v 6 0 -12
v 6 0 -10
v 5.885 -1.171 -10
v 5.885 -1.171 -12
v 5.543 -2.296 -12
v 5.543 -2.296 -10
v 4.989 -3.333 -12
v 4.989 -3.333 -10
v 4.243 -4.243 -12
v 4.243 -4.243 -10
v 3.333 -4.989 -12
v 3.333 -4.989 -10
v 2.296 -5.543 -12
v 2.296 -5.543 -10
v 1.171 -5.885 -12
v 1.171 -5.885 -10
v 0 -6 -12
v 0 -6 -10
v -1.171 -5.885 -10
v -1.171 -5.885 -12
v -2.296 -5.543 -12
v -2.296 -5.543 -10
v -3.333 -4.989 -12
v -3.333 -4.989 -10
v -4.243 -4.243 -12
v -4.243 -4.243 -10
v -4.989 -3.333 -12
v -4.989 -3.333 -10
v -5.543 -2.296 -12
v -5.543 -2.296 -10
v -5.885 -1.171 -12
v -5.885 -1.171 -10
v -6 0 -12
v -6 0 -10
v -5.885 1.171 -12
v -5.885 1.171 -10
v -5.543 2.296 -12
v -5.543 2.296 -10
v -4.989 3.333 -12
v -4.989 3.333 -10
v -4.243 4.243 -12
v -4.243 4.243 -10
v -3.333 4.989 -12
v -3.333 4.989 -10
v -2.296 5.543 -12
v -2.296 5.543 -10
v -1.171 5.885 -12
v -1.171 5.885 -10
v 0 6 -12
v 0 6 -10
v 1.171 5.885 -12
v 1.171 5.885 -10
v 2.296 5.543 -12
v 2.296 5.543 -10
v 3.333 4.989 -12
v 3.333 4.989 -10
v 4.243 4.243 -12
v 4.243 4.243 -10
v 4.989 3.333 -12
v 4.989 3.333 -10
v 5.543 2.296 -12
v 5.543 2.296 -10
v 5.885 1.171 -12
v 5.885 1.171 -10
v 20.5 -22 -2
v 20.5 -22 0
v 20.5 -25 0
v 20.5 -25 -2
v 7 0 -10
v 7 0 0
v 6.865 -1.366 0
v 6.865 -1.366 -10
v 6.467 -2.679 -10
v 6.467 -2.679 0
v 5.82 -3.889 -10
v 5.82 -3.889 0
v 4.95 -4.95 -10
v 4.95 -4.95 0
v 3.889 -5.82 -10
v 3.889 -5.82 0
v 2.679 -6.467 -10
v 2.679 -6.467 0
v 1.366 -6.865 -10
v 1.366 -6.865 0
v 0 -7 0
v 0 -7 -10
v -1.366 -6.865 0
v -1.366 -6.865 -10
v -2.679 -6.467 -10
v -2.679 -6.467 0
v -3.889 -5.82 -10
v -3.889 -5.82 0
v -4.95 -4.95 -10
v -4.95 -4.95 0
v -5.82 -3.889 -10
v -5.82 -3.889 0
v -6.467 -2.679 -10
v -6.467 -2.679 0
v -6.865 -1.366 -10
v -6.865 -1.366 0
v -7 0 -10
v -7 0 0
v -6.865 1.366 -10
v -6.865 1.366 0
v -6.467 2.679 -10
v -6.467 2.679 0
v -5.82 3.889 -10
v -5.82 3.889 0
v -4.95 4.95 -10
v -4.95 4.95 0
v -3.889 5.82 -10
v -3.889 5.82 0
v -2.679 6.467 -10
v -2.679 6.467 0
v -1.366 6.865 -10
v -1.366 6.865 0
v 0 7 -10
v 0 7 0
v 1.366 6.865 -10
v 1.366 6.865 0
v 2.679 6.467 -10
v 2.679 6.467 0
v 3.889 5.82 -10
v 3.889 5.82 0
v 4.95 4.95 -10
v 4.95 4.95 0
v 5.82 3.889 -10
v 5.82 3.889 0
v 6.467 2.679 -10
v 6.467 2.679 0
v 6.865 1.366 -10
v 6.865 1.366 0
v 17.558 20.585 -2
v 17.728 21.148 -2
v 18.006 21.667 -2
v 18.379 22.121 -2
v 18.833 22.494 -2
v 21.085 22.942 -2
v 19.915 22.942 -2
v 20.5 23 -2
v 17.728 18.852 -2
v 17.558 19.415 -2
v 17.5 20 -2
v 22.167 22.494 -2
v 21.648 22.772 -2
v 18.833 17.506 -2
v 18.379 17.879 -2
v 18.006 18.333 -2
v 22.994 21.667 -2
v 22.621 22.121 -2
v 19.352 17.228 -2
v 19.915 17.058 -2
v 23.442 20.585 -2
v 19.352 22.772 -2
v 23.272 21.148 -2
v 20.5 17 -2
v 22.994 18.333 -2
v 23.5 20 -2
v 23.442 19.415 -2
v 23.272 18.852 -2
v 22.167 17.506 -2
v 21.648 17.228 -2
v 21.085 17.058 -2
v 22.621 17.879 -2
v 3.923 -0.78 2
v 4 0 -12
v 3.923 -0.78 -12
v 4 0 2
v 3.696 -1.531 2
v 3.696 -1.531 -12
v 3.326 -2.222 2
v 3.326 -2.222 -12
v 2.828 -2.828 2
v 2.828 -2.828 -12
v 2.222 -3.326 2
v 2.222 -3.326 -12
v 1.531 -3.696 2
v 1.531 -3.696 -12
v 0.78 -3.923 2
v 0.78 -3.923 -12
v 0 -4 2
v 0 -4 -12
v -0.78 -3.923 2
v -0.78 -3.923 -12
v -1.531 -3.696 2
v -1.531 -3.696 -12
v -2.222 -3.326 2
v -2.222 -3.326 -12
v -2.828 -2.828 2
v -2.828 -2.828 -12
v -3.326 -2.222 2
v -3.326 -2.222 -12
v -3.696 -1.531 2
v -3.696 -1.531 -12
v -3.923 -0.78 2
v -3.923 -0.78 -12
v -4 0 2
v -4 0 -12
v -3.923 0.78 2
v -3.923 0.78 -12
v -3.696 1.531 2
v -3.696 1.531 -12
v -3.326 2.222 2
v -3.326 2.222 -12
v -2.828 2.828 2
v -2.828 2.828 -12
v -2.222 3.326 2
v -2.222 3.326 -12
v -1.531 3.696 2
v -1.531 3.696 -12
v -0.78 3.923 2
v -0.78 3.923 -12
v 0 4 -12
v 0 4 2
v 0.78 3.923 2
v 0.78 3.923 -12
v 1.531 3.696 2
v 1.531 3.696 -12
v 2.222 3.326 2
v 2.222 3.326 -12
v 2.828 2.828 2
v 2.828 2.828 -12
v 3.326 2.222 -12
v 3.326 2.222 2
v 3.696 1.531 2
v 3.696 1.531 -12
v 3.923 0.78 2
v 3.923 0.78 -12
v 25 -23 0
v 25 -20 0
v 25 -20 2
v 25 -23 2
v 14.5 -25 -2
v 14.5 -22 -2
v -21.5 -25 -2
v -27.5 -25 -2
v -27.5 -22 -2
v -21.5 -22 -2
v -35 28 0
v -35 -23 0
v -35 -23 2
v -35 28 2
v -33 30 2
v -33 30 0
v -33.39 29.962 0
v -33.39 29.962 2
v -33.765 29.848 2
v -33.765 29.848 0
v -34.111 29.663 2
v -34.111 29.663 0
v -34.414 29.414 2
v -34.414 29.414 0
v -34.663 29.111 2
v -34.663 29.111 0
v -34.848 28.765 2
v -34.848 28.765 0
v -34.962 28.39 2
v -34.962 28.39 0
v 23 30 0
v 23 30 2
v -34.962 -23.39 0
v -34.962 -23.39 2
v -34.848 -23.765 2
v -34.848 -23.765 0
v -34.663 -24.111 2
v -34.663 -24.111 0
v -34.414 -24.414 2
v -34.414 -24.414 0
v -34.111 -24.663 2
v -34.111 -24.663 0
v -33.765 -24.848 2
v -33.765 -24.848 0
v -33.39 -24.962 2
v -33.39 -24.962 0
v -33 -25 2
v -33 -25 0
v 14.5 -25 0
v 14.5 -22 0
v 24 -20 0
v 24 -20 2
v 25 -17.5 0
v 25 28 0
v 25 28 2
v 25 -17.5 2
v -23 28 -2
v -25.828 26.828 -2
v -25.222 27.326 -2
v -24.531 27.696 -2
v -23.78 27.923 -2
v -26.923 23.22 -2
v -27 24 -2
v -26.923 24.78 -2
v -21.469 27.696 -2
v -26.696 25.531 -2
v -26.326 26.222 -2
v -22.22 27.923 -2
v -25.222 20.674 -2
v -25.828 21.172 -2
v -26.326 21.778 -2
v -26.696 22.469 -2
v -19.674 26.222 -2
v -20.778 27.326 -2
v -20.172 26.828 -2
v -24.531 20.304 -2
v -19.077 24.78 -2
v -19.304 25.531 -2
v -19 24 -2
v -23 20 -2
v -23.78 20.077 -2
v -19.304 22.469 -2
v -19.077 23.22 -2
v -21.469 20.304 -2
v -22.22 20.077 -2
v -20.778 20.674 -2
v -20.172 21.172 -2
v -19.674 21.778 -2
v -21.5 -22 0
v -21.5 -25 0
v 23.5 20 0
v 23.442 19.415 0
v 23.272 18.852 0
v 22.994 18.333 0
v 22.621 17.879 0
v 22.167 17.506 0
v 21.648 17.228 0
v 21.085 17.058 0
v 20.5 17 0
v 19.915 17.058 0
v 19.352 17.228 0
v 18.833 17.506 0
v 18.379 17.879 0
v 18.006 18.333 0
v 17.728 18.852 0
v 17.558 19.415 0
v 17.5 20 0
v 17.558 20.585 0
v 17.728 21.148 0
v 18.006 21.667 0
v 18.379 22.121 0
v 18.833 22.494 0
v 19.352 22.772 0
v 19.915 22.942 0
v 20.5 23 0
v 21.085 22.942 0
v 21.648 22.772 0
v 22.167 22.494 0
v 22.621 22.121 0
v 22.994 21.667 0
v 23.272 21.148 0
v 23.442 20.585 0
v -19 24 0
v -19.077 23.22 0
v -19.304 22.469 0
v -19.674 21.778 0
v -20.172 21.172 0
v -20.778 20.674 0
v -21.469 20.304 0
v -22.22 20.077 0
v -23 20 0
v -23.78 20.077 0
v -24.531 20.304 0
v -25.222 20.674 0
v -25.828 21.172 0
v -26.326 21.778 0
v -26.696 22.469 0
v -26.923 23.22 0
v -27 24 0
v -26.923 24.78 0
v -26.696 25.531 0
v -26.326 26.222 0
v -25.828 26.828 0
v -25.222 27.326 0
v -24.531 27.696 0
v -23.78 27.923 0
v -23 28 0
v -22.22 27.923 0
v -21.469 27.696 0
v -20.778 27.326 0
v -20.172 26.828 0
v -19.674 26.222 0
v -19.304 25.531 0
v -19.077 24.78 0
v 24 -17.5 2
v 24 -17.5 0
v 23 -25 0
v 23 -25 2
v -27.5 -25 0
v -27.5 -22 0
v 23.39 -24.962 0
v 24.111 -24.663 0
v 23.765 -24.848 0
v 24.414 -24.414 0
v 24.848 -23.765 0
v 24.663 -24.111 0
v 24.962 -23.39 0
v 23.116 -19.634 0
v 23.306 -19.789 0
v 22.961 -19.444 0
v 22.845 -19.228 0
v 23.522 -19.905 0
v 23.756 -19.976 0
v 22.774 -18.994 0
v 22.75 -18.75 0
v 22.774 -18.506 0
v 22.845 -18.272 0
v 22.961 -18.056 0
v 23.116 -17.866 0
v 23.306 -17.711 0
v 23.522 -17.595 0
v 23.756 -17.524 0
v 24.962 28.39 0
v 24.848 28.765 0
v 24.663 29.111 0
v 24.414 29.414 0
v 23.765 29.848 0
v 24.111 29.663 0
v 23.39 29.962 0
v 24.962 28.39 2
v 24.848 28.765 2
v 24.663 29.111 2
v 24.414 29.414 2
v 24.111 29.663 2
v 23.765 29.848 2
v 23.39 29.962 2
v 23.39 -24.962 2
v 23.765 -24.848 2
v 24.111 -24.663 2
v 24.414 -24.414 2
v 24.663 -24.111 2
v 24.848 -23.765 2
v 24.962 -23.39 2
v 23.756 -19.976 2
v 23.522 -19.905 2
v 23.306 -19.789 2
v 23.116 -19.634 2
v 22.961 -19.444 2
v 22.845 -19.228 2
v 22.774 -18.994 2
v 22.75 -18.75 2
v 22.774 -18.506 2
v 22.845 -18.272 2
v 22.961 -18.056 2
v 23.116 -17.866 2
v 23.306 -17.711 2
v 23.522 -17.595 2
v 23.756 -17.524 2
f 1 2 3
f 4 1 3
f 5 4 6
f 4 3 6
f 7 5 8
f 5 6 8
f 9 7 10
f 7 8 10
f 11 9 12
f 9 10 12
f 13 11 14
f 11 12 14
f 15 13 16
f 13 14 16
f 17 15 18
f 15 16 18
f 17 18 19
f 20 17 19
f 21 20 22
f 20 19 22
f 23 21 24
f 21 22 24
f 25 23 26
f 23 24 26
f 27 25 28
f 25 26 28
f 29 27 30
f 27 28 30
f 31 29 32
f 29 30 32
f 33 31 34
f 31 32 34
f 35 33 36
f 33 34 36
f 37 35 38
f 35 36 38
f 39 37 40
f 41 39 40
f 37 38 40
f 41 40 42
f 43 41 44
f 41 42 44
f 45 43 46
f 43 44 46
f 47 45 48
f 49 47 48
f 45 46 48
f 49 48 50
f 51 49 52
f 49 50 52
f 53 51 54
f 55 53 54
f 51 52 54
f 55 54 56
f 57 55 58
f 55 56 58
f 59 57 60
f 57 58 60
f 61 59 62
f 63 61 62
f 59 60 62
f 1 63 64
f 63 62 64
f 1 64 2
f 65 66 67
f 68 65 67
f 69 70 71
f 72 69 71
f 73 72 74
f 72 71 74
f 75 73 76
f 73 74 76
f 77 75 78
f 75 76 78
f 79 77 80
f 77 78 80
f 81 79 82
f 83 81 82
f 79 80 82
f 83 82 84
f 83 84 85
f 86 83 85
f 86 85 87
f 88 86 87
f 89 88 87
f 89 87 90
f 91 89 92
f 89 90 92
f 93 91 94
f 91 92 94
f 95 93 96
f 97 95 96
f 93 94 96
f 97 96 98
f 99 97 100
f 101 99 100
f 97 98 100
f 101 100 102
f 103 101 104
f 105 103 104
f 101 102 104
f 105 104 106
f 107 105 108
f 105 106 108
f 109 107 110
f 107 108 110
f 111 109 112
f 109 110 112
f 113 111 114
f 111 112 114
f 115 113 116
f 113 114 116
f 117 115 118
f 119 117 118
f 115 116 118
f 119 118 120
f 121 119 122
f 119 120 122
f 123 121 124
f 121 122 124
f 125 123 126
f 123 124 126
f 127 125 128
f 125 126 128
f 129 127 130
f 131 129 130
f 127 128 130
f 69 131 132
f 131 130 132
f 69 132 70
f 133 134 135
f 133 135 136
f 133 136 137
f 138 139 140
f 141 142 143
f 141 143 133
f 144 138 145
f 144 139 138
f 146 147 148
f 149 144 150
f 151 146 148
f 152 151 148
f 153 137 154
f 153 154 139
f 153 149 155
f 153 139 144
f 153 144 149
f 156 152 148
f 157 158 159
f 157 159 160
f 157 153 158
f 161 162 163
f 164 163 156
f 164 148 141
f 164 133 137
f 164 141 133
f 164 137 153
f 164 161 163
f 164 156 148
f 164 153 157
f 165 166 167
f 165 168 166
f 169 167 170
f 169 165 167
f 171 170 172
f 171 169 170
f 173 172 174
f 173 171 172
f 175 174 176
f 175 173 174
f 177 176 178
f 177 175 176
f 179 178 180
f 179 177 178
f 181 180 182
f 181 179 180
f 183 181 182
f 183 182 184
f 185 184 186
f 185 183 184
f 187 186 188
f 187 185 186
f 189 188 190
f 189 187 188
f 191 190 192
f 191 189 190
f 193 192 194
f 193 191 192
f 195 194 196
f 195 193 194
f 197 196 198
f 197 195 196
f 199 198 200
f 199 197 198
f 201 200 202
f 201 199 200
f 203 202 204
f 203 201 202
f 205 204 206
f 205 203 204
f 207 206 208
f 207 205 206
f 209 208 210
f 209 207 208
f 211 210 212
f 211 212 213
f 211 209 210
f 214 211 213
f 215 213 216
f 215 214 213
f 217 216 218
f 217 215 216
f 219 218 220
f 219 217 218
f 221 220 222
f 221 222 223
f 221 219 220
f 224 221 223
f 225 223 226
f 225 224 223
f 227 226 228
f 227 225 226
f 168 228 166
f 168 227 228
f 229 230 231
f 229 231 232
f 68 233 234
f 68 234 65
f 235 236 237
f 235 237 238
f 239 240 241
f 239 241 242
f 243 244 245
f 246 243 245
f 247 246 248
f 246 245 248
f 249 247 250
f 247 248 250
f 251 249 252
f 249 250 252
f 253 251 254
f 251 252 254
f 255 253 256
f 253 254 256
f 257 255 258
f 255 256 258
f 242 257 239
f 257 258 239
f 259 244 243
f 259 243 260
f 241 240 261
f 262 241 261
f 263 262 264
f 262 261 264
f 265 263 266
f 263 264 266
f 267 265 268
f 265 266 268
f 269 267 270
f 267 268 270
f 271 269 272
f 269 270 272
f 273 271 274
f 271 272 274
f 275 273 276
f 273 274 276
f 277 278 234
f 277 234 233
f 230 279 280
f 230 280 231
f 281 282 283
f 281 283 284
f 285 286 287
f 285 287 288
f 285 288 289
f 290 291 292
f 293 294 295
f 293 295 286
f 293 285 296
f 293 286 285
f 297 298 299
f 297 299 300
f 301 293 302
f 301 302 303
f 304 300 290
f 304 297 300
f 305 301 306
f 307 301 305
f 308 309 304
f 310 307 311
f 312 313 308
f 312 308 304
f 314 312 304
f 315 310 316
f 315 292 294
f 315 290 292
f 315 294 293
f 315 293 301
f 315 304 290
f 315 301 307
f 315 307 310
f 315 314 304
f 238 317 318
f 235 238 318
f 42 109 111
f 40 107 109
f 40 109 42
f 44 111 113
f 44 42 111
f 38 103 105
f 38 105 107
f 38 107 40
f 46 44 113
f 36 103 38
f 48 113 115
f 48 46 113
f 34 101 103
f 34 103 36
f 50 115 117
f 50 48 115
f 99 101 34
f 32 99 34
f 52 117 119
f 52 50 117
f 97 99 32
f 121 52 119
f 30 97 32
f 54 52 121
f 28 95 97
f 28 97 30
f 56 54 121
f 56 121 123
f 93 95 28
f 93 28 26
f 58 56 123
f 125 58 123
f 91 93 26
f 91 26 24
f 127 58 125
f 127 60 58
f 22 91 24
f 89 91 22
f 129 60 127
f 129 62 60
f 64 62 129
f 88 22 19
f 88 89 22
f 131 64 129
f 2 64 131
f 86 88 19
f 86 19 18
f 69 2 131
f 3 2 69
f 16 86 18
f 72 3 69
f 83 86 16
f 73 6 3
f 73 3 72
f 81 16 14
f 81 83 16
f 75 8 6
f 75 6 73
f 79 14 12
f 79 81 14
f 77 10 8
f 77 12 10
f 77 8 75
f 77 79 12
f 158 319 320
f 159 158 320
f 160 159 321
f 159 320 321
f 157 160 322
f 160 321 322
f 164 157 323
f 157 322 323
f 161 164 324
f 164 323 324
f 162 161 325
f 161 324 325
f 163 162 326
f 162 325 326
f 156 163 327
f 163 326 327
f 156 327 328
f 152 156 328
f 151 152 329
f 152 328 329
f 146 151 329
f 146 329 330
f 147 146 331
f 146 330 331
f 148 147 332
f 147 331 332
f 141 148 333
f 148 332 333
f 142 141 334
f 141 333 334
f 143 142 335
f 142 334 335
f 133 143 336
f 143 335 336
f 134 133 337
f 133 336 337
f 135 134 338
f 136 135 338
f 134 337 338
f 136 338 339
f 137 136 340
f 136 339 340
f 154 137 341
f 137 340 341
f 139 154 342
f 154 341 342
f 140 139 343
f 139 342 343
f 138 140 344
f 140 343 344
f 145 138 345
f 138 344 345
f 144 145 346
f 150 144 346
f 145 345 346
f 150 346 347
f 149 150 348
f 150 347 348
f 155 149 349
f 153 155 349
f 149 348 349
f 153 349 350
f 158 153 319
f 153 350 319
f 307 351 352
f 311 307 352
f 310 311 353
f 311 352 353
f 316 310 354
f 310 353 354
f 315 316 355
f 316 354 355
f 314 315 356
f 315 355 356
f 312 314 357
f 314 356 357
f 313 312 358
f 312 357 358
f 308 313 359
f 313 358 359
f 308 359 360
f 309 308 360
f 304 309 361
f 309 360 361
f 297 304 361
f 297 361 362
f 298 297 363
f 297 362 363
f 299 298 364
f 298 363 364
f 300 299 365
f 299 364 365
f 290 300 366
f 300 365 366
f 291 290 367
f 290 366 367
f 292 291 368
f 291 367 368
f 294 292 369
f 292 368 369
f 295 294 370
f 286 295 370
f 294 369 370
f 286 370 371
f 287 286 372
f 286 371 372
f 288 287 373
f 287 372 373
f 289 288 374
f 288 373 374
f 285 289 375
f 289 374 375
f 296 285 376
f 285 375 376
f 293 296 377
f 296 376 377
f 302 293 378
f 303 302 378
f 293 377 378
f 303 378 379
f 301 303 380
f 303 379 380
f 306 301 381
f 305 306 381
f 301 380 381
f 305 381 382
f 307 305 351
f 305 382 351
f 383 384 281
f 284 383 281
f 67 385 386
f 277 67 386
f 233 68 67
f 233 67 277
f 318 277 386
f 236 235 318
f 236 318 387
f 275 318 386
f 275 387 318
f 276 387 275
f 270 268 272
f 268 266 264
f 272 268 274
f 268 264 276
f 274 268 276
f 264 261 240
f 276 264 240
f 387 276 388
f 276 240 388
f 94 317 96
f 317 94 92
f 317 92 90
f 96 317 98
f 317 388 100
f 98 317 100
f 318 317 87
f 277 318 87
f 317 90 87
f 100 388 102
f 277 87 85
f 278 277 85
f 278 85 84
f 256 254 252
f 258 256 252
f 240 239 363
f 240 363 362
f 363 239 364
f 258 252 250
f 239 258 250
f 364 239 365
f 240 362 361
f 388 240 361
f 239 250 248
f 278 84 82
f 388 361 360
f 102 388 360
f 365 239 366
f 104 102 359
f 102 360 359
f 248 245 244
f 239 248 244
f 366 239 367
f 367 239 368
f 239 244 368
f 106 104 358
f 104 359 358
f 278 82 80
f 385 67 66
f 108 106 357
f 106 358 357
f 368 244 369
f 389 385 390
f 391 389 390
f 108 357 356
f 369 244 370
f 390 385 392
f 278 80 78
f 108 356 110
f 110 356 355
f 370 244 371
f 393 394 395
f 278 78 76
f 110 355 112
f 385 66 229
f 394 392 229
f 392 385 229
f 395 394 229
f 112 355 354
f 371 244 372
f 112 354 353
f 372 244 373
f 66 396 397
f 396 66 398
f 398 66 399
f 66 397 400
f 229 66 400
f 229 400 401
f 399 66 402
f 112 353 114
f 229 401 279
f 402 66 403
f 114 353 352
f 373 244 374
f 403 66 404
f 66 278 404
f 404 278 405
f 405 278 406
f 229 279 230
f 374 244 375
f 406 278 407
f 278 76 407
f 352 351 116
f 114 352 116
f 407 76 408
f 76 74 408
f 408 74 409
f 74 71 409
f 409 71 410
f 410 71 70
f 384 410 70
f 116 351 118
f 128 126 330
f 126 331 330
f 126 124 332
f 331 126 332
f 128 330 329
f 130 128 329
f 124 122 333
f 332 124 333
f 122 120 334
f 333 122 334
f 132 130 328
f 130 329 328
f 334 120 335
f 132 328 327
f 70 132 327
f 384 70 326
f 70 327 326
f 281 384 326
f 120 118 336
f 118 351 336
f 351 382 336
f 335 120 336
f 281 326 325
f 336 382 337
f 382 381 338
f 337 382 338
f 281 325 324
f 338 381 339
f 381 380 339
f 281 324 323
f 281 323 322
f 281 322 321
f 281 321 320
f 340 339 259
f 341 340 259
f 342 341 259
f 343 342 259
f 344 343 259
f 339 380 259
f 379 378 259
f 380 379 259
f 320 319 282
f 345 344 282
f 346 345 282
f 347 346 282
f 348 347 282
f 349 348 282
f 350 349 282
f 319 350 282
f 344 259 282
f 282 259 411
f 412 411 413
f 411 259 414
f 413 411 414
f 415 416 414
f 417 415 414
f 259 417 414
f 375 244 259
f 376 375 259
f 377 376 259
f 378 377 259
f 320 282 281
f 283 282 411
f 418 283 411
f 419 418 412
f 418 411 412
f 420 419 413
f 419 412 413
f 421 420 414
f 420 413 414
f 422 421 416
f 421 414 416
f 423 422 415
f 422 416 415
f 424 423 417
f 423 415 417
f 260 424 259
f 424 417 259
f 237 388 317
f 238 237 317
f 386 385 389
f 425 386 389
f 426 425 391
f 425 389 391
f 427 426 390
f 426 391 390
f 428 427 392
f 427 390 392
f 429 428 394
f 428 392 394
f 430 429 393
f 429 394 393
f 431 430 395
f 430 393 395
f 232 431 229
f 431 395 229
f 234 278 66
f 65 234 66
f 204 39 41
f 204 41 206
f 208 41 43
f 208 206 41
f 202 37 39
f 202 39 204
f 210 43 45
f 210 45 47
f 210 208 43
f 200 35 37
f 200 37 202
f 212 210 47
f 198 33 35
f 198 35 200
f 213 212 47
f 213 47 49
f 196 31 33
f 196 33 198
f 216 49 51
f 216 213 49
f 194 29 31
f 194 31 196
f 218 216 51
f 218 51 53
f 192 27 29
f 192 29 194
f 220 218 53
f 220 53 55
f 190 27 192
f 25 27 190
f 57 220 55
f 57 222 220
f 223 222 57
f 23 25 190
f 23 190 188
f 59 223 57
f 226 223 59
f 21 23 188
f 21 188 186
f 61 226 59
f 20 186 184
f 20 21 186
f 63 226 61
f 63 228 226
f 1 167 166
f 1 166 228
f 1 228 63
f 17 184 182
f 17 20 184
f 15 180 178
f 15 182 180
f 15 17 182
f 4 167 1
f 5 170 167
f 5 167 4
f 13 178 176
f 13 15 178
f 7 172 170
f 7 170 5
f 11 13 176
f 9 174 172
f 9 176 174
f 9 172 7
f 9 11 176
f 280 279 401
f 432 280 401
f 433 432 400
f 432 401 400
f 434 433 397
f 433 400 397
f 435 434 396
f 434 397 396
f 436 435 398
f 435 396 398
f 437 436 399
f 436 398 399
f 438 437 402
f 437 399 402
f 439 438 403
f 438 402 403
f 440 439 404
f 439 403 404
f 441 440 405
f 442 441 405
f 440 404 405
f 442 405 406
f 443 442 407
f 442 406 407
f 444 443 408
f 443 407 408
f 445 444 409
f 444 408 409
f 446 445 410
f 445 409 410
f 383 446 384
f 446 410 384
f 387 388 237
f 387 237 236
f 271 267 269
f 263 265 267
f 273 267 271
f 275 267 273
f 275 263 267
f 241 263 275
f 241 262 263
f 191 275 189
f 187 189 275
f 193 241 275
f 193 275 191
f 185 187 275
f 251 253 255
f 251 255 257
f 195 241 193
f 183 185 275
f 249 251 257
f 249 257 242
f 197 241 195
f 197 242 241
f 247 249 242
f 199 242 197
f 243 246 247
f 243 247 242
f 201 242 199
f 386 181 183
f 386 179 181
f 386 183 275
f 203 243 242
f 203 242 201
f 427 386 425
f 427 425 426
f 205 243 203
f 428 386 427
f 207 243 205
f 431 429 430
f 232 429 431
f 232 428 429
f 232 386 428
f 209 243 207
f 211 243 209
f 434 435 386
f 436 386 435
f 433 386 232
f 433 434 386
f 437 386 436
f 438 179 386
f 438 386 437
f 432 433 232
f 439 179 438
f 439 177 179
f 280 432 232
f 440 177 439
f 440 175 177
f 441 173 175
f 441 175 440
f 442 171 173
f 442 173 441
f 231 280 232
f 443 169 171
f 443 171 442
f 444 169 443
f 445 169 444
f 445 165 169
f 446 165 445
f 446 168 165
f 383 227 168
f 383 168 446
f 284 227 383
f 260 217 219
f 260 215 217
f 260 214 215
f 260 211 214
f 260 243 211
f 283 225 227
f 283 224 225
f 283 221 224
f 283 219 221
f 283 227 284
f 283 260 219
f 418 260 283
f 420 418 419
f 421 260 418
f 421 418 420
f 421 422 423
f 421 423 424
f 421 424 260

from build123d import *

# Parameters (mm, degrees)
SKETCH_R      = 4
PAD_DEPTH     = 2
SKETCH002_R   = 7
SKETCH002_R_2 = 4
PAD001_DEPTH  = 10
SKETCH003_R   = 6
SKETCH003_R_2 = 4
PAD002_DEPTH  = 2
SKETCH004_R   = 4
SKETCH004_R_2 = 3
SKETCH004_W   = 6
SKETCH004_H   = 3
PAD003_DEPTH  = 2
POCKET_DEPTH  = 5


with BuildPart() as part:
    # Sketch → Pad (new body)
    with BuildSketch(Plane.XY):
        with BuildLine():
            ThreePointArc((-33, 30), (-34.414214, 29.414214), (-35, 28))
            Line((-35, -23), (-35, 28))
            ThreePointArc((-35, -23), (-34.414214, -24.414214), (-33, -25))
            Line((23, -25), (-33, -25))
            ThreePointArc((23, -25), (24.414214, -24.414214), (25, -23))
            Line((25, 28), (25, -23))
            ThreePointArc((25, 28), (24.414214, 29.414214), (23, 30))
            Line((-33, 30), (23, 30))
        make_face()
        Circle(SKETCH_R, mode=Mode.SUBTRACT)
    extrude(amount=PAD_DEPTH)

    # Sketch002 (on Face10 of Pad) → Pad001 (join)
    with BuildSketch(Plane(origin=(0, 0, 0), x_dir=(1, 0, 0), z_dir=(0, 0, -1))):
        Circle(SKETCH002_R)
        Circle(SKETCH002_R_2, mode=Mode.SUBTRACT)
    extrude(amount=PAD001_DEPTH)

    # Sketch003 (on Face12 of Pad001) → Pad002 (join)
    with BuildSketch(Plane(origin=(0, 0, -10), x_dir=(1, 0, 0), z_dir=(0, 0, -1))):
        Circle(SKETCH003_R)
        Circle(SKETCH003_R_2, mode=Mode.SUBTRACT)
    extrude(amount=PAD002_DEPTH)

    # Sketch004 (on Face4 of Pad002) → Pad003 (join)
    with BuildSketch(Plane(origin=(0, 0, 0), x_dir=(1, 0, 0), z_dir=(0, 0, -1))):
        with Locations((-23, -24)):
            Circle(SKETCH004_R)
        with Locations((20.5, -20)):
            Circle(SKETCH004_R_2)
        with Locations((17.5, 23.5)):
            Rectangle(SKETCH004_W, SKETCH004_H)
        with Locations((-24.5, 23.5)):
            Rectangle(SKETCH004_W, SKETCH004_H)
    extrude(amount=PAD003_DEPTH)

    # Sketch005 (on Face4 of Pad003) → Pocket (cut)
    with BuildSketch(Plane(origin=(0, 0, 0), x_dir=(1, 0, 0), z_dir=(0, 0, -1))):
        with BuildLine():
            ThreePointArc((24, 20), (22.75, 18.75), (24, 17.5))
            Line((24, 17.5), (25, 17.5))
            Line((25, 20), (25, 17.5))
            Line((24, 20), (25, 20))
        make_face()
    extrude(amount=-POCKET_DEPTH, mode=Mode.SUBTRACT)


solid = part.part
